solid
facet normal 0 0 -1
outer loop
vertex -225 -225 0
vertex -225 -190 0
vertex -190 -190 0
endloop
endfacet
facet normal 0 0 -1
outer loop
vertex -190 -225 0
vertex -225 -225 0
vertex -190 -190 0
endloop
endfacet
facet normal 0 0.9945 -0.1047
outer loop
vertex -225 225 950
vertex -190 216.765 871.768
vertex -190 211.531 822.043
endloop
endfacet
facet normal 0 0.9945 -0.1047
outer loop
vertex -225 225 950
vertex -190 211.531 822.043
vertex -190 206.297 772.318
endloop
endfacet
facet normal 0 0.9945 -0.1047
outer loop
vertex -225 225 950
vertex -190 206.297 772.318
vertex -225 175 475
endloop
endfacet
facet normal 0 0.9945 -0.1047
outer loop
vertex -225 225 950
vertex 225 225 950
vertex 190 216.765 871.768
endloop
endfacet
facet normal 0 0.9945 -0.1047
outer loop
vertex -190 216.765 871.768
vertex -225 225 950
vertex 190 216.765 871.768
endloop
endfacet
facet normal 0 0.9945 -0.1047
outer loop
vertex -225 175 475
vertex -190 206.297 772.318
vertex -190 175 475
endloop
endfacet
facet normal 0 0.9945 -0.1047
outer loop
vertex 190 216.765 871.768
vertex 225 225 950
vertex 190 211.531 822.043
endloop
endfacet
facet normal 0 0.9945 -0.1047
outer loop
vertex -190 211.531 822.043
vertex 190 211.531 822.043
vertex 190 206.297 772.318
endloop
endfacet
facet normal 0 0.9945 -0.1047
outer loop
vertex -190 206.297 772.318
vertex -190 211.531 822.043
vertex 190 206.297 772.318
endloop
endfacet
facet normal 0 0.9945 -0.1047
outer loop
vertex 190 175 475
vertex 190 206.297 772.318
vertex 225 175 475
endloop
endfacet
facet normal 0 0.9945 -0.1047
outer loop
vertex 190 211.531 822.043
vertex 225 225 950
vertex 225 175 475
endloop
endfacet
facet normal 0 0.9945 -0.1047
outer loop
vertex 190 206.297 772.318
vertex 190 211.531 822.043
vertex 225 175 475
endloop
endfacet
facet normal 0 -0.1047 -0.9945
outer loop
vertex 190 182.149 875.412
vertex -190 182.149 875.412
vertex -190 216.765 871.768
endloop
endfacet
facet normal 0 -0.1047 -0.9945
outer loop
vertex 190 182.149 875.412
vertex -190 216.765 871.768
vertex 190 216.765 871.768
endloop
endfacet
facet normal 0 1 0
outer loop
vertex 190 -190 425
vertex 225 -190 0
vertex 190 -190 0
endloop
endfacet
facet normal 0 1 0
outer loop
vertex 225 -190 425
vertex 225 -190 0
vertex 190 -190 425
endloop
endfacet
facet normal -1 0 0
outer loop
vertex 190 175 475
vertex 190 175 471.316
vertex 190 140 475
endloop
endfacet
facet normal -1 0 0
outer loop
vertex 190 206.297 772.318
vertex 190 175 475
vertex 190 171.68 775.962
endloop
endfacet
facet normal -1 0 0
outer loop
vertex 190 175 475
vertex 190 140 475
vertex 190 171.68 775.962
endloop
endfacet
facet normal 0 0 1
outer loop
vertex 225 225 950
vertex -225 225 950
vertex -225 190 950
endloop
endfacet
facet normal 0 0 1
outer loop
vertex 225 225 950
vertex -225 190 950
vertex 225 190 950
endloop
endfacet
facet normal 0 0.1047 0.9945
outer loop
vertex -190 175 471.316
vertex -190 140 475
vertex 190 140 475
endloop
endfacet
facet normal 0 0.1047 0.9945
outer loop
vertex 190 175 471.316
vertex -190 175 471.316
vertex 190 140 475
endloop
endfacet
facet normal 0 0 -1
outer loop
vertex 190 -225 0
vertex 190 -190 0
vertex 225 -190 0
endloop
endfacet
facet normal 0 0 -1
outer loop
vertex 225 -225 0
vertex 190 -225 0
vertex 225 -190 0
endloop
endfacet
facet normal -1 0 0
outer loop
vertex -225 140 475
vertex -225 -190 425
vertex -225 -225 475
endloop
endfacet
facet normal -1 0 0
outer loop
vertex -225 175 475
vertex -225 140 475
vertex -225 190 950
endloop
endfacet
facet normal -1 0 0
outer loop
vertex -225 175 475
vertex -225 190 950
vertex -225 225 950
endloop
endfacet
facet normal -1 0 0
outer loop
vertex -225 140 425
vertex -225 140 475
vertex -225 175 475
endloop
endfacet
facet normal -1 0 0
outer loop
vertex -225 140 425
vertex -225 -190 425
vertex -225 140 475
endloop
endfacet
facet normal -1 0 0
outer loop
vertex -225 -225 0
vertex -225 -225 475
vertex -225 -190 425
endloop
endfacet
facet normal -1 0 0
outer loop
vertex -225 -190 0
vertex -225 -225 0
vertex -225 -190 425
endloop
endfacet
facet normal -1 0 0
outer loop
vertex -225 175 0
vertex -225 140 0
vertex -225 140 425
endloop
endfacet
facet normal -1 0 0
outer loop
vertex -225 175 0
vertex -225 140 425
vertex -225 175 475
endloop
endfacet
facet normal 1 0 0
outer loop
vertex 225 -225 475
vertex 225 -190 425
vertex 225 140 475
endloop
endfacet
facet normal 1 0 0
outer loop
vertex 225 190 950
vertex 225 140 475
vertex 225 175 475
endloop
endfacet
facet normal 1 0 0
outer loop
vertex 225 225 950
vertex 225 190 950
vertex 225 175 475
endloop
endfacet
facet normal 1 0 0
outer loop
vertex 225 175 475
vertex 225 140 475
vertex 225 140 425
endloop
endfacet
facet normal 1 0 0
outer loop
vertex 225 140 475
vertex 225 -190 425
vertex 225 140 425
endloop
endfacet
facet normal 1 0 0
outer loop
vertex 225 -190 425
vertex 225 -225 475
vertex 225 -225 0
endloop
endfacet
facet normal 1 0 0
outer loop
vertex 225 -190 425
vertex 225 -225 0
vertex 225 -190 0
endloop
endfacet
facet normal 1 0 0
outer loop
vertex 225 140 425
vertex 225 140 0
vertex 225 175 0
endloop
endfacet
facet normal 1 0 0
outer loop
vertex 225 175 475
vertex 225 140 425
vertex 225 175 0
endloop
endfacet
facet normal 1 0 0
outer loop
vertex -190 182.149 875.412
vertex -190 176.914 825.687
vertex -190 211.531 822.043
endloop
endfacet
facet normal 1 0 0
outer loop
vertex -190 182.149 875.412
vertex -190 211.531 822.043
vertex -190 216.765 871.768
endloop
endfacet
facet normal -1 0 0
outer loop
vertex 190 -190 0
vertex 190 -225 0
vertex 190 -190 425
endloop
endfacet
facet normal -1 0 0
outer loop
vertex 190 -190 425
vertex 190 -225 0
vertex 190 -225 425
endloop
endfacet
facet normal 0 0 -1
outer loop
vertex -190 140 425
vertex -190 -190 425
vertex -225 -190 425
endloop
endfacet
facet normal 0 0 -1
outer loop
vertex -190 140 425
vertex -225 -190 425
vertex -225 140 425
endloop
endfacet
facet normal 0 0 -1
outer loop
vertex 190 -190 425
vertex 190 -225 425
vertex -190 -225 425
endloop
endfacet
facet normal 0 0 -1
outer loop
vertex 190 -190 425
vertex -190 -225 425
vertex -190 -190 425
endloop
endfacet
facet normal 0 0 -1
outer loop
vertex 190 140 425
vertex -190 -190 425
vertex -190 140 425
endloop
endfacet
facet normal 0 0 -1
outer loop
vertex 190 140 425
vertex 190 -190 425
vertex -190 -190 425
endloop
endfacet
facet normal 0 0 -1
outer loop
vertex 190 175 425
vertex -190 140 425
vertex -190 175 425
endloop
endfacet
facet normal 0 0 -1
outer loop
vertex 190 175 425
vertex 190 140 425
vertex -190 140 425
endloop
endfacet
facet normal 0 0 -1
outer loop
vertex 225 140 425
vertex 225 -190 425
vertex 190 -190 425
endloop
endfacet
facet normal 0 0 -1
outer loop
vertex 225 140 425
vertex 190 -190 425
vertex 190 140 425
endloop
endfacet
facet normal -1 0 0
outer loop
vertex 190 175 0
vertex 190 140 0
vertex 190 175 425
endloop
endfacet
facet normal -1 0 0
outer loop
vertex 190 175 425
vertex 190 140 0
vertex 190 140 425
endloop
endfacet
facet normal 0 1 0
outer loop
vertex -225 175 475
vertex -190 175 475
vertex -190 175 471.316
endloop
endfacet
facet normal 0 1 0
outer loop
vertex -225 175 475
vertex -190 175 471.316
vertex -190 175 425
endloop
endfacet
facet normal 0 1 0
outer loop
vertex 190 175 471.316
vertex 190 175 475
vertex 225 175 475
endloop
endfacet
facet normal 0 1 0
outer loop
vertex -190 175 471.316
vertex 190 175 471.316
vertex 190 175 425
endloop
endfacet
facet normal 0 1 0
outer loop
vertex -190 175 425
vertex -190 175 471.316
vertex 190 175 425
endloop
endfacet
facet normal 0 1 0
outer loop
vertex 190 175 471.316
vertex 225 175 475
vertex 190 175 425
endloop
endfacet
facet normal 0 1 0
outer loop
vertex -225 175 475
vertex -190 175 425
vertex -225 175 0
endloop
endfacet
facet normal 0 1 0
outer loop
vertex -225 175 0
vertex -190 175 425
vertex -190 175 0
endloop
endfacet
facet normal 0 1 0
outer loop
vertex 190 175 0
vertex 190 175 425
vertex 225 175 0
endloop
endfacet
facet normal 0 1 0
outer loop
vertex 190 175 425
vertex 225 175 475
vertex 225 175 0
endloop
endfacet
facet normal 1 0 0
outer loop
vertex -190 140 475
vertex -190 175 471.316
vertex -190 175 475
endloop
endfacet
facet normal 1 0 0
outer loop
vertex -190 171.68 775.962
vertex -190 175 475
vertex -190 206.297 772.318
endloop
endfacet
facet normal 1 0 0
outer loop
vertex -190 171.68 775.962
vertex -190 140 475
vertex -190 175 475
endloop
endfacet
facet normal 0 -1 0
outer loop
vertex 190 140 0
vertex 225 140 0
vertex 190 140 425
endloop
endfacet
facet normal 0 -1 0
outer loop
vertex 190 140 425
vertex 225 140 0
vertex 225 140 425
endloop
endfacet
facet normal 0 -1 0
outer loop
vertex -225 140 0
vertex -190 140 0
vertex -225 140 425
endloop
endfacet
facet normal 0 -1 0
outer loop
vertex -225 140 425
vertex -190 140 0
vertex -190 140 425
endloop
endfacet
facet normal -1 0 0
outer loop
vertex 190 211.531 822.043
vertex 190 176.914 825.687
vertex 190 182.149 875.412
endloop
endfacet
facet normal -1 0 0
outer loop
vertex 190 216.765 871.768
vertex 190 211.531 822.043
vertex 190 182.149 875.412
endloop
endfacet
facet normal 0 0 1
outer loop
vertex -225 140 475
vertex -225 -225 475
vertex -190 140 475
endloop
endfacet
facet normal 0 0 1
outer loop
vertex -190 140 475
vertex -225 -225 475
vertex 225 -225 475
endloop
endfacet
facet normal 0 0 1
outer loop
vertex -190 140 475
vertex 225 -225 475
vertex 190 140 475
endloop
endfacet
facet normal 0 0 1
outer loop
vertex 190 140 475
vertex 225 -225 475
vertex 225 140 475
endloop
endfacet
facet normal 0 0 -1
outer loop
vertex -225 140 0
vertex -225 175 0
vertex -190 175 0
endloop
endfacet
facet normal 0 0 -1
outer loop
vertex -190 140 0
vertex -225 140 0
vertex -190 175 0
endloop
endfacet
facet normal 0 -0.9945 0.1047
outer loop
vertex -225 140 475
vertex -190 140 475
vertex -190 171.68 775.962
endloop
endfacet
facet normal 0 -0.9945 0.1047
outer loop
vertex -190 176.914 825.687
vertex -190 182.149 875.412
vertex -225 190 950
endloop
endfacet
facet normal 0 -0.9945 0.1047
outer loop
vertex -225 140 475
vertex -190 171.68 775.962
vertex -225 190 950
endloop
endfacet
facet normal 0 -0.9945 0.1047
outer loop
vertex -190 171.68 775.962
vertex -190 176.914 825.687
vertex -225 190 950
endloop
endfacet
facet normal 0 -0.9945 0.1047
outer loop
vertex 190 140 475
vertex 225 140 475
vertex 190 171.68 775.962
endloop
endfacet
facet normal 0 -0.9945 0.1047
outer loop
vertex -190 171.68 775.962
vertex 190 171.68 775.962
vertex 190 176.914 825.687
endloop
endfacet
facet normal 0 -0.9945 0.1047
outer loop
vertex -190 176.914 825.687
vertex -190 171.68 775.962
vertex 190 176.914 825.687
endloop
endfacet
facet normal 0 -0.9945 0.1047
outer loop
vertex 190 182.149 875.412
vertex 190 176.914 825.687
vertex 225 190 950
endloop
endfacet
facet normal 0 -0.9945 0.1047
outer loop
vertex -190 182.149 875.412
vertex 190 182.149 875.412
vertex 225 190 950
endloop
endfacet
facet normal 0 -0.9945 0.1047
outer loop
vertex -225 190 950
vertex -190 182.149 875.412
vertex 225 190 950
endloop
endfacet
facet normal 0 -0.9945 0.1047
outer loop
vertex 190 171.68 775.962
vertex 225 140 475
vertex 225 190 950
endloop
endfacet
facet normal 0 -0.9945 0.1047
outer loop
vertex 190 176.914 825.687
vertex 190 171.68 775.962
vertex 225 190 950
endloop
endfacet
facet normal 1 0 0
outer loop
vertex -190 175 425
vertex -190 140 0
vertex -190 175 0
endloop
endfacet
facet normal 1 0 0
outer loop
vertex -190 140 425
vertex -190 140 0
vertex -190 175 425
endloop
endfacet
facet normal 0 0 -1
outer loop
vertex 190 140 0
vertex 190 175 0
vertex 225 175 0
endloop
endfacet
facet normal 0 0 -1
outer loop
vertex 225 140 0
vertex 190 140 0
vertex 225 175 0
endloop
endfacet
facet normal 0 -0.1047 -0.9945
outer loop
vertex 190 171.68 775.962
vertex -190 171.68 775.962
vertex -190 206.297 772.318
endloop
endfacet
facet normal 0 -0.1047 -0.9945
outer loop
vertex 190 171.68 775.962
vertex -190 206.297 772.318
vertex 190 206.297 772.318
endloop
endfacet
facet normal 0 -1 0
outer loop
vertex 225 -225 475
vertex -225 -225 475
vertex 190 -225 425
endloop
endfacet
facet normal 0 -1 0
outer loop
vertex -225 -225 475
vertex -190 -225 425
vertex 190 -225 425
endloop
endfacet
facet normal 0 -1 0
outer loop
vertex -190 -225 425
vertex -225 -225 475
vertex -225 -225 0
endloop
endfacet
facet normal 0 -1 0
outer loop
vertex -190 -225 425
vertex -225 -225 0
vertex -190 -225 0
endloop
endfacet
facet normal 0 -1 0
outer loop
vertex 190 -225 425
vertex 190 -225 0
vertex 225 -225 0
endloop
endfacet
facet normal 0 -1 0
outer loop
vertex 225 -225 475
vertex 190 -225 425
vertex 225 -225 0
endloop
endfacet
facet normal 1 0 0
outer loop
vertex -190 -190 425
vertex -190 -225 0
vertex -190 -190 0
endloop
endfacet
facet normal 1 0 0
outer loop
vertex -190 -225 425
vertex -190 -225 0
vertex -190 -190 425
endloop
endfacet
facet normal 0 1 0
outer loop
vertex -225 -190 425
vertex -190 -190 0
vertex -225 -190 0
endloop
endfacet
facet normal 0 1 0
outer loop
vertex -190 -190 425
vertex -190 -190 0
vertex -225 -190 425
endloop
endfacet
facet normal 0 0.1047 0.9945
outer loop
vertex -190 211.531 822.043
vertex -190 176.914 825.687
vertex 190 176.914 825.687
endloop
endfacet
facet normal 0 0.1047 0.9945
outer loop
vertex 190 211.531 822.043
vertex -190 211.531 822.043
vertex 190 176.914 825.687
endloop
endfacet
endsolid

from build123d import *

# Parameters (mm, degrees)
F0_W     = 450
F0_H     = 450
F1_DEPTH = 950
F2_W     = 330
F2_H     = 425
F2_W_2   = 50
F2_H_2   = 50
F3_DEPTH = 450.001
F4_W     = 380
F4_H     = 425
F5_DEPTH = 450.001
F6_W     = 380
F6_H     = 302.6243293636
F6_H_2   = 50
F7_DEPTH = 134.2592361444


with BuildPart() as f1:
    # F0 (on Top) → F1 (new body)
    with BuildSketch(Plane.XY):
        Rectangle(F0_W, F0_H)
    extrude(amount=F1_DEPTH)

    # F2 (on face) → F3 (cut, through all)
    with BuildSketch(Plane.YZ.offset(225)):
        Polygon((-225, 475), (140, 475), (190, 950), (-225, 950), align=None)
        with Locations((-25, 212.5)):
            Rectangle(F2_W, F2_H)
        with Locations((200, 212.5)):
            Rectangle(F2_W_2, F2_H)
        with Locations((200, 450)):
            Rectangle(F2_W_2, F2_H_2)
        Polygon((175, 475), (225, 475), (225, 950), align=None)
    extrude(amount=-F3_DEPTH, mode=Mode.SUBTRACT)

    # F4 (on face) → F5 (cut, through all)
    with BuildSketch(Plane.XZ.offset(225)):
        with Locations((0, 212.5)):
            Rectangle(F4_W, F4_H)
    extrude(amount=-F5_DEPTH, mode=Mode.SUBTRACT)

    # F6 (on face) → F7 (cut, through all)
    with BuildSketch(Plane(origin=(0, 89.0136986301, -9.3698630137), x_dir=(1, 0, 0), z_dir=(0, -0.9945054529, 0.1046847845))):
        with Locations((0, 638.358124652)):
            Rectangle(F6_W, F6_H)
        with Locations((0, 864.6702893338)):
            Rectangle(F6_W, F6_H_2)
    extrude(amount=-F7_DEPTH, mode=Mode.SUBTRACT)


solid = f1.part
